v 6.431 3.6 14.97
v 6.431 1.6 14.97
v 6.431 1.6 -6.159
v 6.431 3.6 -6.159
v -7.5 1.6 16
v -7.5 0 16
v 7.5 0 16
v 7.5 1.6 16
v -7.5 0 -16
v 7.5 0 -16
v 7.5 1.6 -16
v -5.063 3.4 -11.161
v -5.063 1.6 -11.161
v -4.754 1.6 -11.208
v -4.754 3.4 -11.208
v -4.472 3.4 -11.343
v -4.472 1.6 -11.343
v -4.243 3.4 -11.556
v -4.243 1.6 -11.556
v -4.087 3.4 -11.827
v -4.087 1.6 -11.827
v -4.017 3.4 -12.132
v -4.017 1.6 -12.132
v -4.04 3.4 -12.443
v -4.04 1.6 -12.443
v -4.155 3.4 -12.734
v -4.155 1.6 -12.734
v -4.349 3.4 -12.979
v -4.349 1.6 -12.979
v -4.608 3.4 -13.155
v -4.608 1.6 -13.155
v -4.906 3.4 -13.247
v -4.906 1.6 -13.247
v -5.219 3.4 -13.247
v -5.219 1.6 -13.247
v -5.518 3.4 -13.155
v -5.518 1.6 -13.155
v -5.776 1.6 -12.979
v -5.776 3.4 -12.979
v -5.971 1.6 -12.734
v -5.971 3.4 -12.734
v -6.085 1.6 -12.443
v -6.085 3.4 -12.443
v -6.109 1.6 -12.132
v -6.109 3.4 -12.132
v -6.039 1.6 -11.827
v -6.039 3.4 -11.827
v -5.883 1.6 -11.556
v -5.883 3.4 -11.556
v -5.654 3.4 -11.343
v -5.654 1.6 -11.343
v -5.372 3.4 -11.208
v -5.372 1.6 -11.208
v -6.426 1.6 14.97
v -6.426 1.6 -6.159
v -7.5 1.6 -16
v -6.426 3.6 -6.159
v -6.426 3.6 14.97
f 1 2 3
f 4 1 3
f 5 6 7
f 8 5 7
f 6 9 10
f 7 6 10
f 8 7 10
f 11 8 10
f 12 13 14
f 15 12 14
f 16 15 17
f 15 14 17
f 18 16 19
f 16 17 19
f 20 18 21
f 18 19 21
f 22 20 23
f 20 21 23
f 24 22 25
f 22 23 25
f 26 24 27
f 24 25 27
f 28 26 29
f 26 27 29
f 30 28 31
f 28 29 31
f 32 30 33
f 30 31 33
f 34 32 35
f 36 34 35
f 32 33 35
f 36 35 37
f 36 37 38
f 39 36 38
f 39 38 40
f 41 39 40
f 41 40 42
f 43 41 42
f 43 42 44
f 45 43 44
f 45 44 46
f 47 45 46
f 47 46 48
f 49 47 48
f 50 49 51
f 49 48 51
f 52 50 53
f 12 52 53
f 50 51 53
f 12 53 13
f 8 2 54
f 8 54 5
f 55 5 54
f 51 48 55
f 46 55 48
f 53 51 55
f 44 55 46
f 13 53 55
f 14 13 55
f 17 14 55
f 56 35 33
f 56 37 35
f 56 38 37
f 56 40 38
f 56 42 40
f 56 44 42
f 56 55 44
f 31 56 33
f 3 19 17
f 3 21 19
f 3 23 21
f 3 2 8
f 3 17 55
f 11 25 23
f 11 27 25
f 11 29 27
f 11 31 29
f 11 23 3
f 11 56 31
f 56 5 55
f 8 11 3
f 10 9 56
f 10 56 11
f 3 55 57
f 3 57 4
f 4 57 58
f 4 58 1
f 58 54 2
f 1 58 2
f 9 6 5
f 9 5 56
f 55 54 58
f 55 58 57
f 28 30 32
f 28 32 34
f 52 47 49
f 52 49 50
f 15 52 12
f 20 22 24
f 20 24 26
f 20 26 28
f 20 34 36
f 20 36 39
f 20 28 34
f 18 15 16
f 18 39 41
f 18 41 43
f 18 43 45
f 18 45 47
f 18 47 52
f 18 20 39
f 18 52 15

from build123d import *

# Parameters (mm, degrees)
SKETCH_1_W      = 15
SKETCH_1_H      = 32
EXTRUDE_1_DEPTH = 1.6
SKETCH_2_W      = 12.857079129
SKETCH_2_H      = 21.128766401
EXTRUDE_2_DEPTH = 2
SKETCH_3_R      = 1.048746982
EXTRUDE_3_DEPTH = 1.8


with BuildPart() as part:
    # 草图1 → 凸台-拉伸1 (new body)
    with BuildSketch(Plane(origin=(0, 0, 0), x_dir=(1, 0, 0), z_dir=(0, 1, 0))):
        Rectangle(SKETCH_1_W, SKETCH_1_H)
    extrude(amount=EXTRUDE_1_DEPTH)

    # 草图2 → 凸台-拉伸2 (add)
    with BuildSketch(Plane(origin=(0, 1.6, 0), x_dir=(1, 0, 0), z_dir=(0, 1, 0))):
        with Locations((0.002075323, -4.405572569)):
            Rectangle(SKETCH_2_W, SKETCH_2_H)
    extrude(amount=EXTRUDE_2_DEPTH)

    # 草图3 → 凸台-拉伸3 (add)
    with BuildSketch(Plane(origin=(0, 1.6, 0), x_dir=(1, 0, 0), z_dir=(0, 1, 0))):
        with Locations(Location((-5.062783927, 12.209984483, 0), (0, 0, 270))):
            Circle(SKETCH_3_R)
    extrude(amount=EXTRUDE_3_DEPTH)


solid = part.part
